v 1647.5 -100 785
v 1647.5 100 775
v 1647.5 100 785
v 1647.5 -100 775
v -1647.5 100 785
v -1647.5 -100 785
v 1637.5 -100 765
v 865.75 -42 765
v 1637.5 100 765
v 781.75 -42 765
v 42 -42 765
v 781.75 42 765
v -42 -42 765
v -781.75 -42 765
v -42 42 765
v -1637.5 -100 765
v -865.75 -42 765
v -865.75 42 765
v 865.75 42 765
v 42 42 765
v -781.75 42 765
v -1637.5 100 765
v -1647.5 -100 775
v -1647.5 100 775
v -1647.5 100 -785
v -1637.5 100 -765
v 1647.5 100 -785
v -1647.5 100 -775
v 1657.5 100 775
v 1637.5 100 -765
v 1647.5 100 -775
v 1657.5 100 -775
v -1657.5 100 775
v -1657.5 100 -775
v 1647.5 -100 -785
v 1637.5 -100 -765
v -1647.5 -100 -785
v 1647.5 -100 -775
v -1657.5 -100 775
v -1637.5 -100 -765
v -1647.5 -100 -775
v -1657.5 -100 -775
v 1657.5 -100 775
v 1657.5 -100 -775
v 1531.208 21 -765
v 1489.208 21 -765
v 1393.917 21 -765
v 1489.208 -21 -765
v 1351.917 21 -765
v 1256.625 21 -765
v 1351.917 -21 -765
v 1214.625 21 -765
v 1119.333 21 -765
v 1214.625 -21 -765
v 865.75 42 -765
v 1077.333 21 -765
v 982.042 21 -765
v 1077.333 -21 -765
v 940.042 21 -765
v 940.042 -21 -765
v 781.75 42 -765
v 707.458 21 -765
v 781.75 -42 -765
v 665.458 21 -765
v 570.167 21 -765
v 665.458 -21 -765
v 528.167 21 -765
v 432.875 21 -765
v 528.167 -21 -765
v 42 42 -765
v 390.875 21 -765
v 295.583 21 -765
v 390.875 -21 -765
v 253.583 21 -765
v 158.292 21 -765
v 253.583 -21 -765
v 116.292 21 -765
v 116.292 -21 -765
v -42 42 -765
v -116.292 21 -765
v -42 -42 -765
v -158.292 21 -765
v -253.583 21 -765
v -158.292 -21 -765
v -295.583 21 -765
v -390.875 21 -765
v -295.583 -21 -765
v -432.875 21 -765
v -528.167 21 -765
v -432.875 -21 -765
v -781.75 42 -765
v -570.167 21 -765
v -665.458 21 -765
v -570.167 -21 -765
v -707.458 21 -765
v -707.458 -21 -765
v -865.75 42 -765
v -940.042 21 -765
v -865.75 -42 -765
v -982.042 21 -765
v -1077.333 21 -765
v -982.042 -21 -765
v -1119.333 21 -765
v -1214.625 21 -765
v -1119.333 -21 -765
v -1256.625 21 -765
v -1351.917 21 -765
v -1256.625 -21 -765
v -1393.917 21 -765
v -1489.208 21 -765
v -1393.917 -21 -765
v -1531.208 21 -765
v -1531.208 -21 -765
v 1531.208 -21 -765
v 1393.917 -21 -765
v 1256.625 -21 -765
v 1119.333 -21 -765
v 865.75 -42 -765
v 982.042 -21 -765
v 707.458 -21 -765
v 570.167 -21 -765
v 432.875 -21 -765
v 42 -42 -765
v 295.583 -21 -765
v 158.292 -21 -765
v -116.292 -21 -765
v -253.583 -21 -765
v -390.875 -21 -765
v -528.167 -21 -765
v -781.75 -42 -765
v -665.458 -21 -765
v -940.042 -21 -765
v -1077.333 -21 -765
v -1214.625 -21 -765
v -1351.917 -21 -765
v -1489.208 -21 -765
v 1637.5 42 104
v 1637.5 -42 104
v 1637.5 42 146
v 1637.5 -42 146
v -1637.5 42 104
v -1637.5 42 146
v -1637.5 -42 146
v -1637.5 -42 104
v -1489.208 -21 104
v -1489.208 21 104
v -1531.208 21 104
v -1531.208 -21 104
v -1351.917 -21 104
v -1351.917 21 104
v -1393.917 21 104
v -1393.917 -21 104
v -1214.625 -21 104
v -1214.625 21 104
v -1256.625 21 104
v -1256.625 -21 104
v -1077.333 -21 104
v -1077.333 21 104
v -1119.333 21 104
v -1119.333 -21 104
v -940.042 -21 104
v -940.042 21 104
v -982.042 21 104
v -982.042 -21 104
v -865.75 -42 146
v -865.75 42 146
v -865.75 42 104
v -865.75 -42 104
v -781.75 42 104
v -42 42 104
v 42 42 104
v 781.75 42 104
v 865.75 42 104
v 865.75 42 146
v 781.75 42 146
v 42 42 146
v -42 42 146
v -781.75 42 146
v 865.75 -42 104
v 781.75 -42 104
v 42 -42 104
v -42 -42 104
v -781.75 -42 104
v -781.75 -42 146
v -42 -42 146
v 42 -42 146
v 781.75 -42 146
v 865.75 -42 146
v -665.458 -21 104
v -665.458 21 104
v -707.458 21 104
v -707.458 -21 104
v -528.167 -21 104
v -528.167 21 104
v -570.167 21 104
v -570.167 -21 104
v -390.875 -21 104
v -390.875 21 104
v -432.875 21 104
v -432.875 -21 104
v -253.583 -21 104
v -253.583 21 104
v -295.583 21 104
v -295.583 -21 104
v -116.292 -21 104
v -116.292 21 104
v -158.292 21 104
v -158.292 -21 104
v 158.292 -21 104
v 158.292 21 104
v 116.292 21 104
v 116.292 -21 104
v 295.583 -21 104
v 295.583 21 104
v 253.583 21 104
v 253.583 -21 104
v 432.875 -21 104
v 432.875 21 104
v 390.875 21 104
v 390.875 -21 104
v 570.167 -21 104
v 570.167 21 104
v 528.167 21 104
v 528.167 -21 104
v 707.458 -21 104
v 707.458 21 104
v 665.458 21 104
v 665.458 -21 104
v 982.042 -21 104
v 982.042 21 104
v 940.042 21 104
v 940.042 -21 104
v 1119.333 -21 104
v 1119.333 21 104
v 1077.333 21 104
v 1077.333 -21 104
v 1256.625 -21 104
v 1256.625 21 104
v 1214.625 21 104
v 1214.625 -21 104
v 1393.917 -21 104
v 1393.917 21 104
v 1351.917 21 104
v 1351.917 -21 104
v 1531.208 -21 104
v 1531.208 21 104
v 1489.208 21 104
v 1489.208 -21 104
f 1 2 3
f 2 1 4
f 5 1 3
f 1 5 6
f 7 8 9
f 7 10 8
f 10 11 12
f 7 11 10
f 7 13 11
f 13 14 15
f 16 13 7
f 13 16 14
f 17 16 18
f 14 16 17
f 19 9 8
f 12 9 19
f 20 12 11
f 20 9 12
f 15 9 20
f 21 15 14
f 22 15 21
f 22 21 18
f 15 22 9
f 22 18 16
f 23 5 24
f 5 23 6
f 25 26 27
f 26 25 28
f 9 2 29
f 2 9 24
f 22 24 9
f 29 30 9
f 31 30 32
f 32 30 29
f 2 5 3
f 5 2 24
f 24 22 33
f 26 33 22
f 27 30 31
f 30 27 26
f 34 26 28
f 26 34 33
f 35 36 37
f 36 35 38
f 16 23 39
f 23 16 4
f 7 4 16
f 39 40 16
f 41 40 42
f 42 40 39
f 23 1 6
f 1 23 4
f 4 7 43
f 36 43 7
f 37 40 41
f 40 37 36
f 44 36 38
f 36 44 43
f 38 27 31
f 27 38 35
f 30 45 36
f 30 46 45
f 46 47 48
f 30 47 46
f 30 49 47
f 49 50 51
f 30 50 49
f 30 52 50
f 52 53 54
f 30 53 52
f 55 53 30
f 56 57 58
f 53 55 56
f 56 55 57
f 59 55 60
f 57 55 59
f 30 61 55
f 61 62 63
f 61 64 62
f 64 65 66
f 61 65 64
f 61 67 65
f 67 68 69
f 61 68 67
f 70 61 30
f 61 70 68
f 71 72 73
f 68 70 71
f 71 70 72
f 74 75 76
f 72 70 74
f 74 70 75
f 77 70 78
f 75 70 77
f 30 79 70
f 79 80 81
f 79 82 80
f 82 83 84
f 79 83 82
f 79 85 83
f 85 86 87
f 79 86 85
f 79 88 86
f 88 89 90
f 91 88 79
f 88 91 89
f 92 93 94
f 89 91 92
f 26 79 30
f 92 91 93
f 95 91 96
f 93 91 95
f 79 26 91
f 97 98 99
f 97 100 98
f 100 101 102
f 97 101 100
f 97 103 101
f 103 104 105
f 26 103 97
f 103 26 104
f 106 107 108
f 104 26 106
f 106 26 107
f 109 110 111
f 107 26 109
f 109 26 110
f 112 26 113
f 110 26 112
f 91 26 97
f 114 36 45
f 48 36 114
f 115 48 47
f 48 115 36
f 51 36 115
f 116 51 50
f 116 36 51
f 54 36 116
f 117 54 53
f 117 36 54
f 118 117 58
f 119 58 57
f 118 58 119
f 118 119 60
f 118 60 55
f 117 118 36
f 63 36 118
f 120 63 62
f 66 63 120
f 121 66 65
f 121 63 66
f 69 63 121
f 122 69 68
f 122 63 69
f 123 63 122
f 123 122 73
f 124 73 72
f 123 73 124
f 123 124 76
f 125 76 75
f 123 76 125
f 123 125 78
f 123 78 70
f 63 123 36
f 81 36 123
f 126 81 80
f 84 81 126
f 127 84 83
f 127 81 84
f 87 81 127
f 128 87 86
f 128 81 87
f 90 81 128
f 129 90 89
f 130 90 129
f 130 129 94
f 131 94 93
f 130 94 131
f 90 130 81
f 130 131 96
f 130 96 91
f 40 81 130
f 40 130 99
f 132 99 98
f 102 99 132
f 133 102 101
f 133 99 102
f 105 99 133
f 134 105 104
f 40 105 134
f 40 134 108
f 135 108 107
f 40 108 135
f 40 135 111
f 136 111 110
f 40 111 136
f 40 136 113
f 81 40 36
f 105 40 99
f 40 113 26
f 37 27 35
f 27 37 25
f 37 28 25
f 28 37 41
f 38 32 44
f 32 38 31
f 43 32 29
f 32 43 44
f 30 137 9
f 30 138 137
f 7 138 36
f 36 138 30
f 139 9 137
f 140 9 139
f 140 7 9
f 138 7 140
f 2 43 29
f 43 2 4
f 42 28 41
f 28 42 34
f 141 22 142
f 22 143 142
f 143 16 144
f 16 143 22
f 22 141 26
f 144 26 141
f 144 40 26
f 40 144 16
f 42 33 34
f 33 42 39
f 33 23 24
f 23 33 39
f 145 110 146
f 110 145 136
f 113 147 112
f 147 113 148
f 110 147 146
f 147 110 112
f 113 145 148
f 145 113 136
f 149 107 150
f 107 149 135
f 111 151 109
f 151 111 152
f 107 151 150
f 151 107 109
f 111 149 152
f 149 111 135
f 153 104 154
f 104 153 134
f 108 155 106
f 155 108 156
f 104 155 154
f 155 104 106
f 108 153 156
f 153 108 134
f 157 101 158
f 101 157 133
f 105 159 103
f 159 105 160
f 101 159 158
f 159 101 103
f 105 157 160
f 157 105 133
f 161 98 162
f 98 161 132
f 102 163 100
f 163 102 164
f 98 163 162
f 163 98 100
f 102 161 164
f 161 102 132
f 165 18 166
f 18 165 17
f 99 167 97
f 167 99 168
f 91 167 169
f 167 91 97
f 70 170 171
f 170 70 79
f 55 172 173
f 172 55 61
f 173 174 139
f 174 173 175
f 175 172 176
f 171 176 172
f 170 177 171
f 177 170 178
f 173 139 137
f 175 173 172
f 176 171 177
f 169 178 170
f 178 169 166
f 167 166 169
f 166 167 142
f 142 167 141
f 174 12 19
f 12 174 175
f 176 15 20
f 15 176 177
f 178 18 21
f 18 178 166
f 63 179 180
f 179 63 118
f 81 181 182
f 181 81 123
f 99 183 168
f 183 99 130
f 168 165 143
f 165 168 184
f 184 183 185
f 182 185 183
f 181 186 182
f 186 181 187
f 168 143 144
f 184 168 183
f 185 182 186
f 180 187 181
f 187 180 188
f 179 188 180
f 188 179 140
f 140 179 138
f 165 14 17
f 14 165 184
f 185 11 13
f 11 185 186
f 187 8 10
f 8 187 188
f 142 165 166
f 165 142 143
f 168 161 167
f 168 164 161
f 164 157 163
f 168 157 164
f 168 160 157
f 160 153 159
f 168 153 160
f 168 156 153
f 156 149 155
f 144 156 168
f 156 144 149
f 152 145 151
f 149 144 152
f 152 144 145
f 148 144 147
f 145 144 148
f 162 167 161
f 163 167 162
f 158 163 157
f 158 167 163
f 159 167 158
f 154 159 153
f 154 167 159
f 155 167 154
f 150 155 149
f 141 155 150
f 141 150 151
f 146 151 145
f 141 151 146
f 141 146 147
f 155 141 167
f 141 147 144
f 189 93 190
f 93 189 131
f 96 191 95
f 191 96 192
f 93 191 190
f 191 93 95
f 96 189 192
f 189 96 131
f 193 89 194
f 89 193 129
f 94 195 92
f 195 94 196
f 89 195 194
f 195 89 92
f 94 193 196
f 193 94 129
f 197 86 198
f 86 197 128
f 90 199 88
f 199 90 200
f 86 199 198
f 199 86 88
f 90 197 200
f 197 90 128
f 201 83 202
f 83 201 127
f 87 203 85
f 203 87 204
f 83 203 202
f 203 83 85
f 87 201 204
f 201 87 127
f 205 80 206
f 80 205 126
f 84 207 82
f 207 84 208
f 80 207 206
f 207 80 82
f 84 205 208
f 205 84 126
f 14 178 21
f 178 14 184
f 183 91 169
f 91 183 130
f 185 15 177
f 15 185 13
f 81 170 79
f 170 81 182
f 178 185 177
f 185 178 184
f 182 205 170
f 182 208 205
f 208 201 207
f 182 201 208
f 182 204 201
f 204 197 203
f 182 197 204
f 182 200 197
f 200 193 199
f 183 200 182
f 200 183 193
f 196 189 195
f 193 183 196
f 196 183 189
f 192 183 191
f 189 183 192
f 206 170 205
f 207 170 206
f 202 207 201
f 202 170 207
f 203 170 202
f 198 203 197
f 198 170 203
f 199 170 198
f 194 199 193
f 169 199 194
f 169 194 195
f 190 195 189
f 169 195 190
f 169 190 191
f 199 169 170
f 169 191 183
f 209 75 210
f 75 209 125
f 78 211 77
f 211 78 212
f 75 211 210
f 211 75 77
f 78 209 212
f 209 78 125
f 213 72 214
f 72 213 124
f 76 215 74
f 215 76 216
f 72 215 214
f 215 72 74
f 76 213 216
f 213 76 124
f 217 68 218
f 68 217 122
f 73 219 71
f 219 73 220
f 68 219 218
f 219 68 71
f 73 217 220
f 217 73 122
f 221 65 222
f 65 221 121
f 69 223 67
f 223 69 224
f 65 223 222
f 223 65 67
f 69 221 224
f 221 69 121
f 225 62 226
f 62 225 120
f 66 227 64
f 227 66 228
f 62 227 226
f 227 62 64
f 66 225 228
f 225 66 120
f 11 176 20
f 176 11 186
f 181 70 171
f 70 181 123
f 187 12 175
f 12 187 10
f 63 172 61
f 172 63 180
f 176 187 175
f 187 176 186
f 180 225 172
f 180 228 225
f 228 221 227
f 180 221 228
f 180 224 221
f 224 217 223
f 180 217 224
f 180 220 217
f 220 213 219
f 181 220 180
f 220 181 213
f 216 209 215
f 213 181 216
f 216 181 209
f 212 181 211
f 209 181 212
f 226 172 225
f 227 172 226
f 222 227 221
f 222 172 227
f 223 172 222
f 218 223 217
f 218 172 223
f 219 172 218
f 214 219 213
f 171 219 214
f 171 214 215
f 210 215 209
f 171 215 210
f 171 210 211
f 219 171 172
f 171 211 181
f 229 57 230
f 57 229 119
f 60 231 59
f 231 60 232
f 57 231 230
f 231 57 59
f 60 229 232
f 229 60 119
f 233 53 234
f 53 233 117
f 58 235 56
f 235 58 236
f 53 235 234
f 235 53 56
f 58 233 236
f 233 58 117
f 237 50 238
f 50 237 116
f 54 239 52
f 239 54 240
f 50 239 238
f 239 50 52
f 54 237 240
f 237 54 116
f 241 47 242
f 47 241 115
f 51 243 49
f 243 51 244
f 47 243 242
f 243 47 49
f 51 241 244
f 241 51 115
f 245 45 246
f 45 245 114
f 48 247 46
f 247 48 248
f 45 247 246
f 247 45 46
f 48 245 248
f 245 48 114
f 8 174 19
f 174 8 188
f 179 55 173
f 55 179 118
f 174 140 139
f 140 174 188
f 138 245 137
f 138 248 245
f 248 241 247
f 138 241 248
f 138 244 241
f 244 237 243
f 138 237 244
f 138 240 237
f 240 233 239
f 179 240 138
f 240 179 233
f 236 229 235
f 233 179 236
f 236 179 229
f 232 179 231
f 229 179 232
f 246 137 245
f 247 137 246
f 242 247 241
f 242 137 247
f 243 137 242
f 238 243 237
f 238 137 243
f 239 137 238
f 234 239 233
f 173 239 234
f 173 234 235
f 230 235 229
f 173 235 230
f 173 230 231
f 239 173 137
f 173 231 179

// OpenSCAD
// configure
bt = 42;
bh = 1550;
fh = 1550;
fw = 3295;
fbw = 200;
fbt = 20;

module frame(h) {
    // Frame top/bottom
    translate([0, 0, fh/2])
        cube([fw, fbw, fbt], center = true);
    translate([0, 0, -fh/2])
        cube([fw, fbw, fbt], center = true);

    // Frame left/right
    translate([fw/2, 0, 0])
        rotate([0, 90, 0])
        cube([fh, fbw, fbt], center = true);
    translate([-fw/2, 0, 0])
        rotate([0, 90, 0])
        cube([fh, fbw, fbt], center = true);
}

module beam(h) {
    cube([bt, bt, h], center = true);
}

module beams(h, cc, nbr) {
    for (i = [0:nbr-1])
        translate([i*cc, 0, 0])
        beam(h);
}

if (false) {
    frame();
    translate([-fw/2, 0, -bh/2])
        beams(bh, 142, 23);
}

module section(l, r, h1, h2, w) {
    if (l) {
        translate([-w/2 + bt/2, 0, 0])
            cube([bt, 2*bt, h1], center = true);
    }
    if (r) {
        translate([w/2 - bt/2, 0, 0])
            cube([bt, 2*bt, h1], center = true);
    }
    translate([-w/2 + w/6, 0, -(h1 - h2)/2])
        beams(h2, w/6, 5);
    translate([0, 0, h2 - h1/2])
        cube([w, 2*bt, bt], center = true);
}

if (true) {
    frame();
    let (h2 = 900)
    translate([-1.5*fw/4, 0, 0])
    union() {
        translate([0*fw/4, 0, 0])
            section(false, true, fh, h2, fw/4);
        translate([1*fw/4, 0, 0])
            section(true, true, fh, h2, fw/4);
        translate([2*fw/4, 0, 0])
            section(true, true, fh, h2, fw/4);
        translate([3*fw/4, 0, 0])
            section(true, false, fh, h2, fw/4);
    }
}
